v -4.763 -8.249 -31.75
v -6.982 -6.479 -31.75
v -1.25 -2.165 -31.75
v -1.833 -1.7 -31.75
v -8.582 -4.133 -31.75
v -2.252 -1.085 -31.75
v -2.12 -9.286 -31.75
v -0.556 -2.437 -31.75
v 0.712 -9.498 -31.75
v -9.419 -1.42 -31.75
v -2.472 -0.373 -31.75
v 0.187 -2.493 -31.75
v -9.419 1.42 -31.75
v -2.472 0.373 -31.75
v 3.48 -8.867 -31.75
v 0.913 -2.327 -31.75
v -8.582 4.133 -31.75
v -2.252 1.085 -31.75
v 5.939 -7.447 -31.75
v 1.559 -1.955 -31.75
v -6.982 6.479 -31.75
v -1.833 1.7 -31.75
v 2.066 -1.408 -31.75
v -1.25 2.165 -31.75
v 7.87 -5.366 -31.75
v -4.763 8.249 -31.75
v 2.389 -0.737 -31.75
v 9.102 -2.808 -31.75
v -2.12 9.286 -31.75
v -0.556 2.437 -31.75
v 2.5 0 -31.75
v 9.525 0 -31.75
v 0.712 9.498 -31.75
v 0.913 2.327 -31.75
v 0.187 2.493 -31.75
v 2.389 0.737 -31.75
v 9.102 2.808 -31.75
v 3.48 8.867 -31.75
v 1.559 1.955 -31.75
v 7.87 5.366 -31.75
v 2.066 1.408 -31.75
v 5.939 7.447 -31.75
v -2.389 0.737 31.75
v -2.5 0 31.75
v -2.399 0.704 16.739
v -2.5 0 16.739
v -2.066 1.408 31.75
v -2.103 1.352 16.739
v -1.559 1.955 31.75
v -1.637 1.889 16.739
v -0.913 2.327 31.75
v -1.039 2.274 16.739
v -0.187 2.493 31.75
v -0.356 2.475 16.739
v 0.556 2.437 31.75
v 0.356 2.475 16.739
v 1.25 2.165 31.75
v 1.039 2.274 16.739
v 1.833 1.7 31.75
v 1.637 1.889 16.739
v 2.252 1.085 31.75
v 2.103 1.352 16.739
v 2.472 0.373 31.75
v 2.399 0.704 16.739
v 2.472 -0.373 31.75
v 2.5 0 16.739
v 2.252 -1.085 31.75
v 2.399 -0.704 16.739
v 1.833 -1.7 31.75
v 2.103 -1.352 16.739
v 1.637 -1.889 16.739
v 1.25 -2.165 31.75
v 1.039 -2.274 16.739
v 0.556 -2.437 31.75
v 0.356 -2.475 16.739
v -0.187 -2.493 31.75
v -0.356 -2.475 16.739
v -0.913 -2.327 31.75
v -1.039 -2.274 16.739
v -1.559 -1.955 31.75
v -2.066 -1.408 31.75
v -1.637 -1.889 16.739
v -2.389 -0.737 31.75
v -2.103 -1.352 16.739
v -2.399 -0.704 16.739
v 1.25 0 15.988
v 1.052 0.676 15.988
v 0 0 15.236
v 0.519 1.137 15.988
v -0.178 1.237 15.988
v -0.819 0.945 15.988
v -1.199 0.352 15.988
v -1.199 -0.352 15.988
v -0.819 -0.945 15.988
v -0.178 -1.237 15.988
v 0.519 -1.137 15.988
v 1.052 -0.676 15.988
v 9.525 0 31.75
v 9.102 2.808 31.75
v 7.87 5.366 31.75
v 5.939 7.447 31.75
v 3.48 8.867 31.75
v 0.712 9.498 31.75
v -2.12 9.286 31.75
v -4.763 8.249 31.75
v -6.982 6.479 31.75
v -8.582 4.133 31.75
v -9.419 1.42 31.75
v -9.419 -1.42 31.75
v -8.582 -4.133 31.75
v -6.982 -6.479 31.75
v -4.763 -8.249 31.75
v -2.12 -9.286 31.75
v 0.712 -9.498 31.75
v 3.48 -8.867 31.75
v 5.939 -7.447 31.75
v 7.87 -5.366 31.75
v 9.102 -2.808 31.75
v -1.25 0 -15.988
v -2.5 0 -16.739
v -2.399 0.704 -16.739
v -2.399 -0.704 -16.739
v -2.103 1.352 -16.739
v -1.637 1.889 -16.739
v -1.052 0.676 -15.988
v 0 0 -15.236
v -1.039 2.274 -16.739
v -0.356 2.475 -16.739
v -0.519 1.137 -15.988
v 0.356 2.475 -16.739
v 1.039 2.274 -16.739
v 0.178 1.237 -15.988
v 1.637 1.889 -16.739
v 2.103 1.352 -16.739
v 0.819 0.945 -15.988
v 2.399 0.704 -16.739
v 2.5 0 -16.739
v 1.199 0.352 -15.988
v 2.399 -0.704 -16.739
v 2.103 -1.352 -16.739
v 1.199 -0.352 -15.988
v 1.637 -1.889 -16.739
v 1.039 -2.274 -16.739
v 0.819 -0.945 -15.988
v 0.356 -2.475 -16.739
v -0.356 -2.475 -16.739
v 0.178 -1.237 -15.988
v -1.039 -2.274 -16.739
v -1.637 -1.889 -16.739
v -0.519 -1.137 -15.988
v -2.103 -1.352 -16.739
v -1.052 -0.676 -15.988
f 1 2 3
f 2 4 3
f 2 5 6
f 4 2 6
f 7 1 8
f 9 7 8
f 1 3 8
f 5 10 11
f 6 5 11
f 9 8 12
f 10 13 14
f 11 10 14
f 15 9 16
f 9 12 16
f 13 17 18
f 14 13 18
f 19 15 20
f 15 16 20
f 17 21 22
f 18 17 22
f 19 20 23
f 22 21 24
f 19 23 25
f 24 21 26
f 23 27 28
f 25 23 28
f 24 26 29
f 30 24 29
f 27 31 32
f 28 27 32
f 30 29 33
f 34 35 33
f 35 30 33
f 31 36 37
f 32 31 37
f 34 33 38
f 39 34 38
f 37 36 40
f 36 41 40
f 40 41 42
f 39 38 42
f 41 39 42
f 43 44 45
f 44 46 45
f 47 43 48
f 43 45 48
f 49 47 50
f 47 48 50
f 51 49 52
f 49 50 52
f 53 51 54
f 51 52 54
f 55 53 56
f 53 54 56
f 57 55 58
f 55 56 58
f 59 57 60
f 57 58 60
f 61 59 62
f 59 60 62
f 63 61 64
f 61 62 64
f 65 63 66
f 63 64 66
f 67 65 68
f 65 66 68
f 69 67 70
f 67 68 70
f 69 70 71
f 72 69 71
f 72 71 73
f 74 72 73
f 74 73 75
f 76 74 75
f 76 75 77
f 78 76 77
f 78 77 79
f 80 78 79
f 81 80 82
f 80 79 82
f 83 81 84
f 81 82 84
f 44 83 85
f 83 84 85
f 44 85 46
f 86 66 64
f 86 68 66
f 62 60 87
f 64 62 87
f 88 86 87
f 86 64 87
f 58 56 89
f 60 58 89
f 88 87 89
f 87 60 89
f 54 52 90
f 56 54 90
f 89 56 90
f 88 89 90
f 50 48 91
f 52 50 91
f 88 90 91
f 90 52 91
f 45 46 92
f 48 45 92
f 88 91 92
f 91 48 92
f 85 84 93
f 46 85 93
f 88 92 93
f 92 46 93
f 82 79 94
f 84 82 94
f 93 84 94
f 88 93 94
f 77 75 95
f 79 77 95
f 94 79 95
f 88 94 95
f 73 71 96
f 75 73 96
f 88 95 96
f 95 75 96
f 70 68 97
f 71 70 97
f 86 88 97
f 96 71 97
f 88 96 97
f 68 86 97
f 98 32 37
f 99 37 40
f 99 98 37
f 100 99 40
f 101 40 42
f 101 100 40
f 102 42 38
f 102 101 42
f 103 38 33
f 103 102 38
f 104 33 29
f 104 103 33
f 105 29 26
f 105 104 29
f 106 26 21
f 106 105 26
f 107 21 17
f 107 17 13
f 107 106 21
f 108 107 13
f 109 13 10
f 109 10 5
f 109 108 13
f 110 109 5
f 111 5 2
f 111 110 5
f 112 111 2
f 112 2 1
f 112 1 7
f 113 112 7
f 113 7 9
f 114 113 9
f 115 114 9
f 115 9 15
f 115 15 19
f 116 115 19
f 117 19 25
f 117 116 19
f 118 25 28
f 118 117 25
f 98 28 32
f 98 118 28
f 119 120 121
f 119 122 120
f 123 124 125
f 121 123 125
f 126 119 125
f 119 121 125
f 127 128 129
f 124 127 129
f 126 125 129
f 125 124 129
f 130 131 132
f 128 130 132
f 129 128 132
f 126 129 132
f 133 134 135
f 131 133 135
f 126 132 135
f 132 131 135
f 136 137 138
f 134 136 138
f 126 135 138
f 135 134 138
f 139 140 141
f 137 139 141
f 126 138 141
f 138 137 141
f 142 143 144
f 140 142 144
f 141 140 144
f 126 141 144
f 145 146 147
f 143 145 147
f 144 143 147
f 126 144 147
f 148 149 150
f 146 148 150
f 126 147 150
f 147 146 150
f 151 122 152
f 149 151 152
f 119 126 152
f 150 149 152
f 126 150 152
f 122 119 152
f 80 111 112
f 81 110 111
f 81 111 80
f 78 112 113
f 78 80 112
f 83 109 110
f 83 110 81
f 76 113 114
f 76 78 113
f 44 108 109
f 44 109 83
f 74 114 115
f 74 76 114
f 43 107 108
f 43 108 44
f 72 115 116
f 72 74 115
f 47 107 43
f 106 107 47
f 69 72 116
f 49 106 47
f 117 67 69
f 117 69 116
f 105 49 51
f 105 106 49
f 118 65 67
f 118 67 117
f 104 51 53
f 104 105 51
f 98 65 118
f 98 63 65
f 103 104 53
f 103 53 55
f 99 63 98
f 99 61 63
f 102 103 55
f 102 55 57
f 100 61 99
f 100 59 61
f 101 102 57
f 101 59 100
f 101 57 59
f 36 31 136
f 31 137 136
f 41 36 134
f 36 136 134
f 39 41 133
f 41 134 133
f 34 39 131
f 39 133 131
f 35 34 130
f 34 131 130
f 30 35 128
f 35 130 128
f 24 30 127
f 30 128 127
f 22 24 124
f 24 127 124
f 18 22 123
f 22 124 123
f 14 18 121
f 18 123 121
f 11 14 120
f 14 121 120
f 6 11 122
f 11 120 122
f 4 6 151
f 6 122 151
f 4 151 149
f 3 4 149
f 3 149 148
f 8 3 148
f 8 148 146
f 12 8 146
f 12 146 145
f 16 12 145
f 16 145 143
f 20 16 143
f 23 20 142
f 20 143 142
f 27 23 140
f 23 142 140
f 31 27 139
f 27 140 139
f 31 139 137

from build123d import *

# Parameters (mm, degrees)
SKETCH1_R                 = 9.525
BOSS_EXTRUDE1_DEPTH       = 31.75
M6X1_0_TAPPED_HOLE1_D     = 5
M6X1_0_TAPPED_HOLE1_DEPTH = 15.0114
M6X1_0_TAPPED_HOLE1_TIP   = 1.502151548
M6X1_0_TAPPED_HOLE2_D     = 5
M6X1_0_TAPPED_HOLE2_DEPTH = 15.0114
M6X1_0_TAPPED_HOLE2_TIP   = 1.502151548


with BuildPart() as part:
    # Sketch1 → Boss-Extrude1 (new body, symmetric)
    with BuildSketch(Plane.XY):
        Circle(SKETCH1_R)
    extrude(amount=BOSS_EXTRUDE1_DEPTH, both=True)

    # M6x1.0 Tapped Hole1
    with Locations(Plane.XY.offset(31.75)):
        with Locations((0, 0)):
            Hole(M6X1_0_TAPPED_HOLE1_D / 2, depth=M6X1_0_TAPPED_HOLE1_DEPTH)
            with Locations((0, 0, -(M6X1_0_TAPPED_HOLE1_DEPTH + M6X1_0_TAPPED_HOLE1_TIP / 2))):  # 118° drill point
                Cone(0, M6X1_0_TAPPED_HOLE1_D / 2, M6X1_0_TAPPED_HOLE1_TIP, mode=Mode.SUBTRACT)

    # M6x1.0 Tapped Hole2
    with Locations(Plane(origin=(0, 0, -31.75), x_dir=(-1, 0, 0), z_dir=(0, 0, -1))):
        with Locations((0, 0)):
            Hole(M6X1_0_TAPPED_HOLE2_D / 2, depth=M6X1_0_TAPPED_HOLE2_DEPTH)
            with Locations((0, 0, -(M6X1_0_TAPPED_HOLE2_DEPTH + M6X1_0_TAPPED_HOLE2_TIP / 2))):  # 118° drill point
                Cone(0, M6X1_0_TAPPED_HOLE2_D / 2, M6X1_0_TAPPED_HOLE2_TIP, mode=Mode.SUBTRACT)


solid = part.part
